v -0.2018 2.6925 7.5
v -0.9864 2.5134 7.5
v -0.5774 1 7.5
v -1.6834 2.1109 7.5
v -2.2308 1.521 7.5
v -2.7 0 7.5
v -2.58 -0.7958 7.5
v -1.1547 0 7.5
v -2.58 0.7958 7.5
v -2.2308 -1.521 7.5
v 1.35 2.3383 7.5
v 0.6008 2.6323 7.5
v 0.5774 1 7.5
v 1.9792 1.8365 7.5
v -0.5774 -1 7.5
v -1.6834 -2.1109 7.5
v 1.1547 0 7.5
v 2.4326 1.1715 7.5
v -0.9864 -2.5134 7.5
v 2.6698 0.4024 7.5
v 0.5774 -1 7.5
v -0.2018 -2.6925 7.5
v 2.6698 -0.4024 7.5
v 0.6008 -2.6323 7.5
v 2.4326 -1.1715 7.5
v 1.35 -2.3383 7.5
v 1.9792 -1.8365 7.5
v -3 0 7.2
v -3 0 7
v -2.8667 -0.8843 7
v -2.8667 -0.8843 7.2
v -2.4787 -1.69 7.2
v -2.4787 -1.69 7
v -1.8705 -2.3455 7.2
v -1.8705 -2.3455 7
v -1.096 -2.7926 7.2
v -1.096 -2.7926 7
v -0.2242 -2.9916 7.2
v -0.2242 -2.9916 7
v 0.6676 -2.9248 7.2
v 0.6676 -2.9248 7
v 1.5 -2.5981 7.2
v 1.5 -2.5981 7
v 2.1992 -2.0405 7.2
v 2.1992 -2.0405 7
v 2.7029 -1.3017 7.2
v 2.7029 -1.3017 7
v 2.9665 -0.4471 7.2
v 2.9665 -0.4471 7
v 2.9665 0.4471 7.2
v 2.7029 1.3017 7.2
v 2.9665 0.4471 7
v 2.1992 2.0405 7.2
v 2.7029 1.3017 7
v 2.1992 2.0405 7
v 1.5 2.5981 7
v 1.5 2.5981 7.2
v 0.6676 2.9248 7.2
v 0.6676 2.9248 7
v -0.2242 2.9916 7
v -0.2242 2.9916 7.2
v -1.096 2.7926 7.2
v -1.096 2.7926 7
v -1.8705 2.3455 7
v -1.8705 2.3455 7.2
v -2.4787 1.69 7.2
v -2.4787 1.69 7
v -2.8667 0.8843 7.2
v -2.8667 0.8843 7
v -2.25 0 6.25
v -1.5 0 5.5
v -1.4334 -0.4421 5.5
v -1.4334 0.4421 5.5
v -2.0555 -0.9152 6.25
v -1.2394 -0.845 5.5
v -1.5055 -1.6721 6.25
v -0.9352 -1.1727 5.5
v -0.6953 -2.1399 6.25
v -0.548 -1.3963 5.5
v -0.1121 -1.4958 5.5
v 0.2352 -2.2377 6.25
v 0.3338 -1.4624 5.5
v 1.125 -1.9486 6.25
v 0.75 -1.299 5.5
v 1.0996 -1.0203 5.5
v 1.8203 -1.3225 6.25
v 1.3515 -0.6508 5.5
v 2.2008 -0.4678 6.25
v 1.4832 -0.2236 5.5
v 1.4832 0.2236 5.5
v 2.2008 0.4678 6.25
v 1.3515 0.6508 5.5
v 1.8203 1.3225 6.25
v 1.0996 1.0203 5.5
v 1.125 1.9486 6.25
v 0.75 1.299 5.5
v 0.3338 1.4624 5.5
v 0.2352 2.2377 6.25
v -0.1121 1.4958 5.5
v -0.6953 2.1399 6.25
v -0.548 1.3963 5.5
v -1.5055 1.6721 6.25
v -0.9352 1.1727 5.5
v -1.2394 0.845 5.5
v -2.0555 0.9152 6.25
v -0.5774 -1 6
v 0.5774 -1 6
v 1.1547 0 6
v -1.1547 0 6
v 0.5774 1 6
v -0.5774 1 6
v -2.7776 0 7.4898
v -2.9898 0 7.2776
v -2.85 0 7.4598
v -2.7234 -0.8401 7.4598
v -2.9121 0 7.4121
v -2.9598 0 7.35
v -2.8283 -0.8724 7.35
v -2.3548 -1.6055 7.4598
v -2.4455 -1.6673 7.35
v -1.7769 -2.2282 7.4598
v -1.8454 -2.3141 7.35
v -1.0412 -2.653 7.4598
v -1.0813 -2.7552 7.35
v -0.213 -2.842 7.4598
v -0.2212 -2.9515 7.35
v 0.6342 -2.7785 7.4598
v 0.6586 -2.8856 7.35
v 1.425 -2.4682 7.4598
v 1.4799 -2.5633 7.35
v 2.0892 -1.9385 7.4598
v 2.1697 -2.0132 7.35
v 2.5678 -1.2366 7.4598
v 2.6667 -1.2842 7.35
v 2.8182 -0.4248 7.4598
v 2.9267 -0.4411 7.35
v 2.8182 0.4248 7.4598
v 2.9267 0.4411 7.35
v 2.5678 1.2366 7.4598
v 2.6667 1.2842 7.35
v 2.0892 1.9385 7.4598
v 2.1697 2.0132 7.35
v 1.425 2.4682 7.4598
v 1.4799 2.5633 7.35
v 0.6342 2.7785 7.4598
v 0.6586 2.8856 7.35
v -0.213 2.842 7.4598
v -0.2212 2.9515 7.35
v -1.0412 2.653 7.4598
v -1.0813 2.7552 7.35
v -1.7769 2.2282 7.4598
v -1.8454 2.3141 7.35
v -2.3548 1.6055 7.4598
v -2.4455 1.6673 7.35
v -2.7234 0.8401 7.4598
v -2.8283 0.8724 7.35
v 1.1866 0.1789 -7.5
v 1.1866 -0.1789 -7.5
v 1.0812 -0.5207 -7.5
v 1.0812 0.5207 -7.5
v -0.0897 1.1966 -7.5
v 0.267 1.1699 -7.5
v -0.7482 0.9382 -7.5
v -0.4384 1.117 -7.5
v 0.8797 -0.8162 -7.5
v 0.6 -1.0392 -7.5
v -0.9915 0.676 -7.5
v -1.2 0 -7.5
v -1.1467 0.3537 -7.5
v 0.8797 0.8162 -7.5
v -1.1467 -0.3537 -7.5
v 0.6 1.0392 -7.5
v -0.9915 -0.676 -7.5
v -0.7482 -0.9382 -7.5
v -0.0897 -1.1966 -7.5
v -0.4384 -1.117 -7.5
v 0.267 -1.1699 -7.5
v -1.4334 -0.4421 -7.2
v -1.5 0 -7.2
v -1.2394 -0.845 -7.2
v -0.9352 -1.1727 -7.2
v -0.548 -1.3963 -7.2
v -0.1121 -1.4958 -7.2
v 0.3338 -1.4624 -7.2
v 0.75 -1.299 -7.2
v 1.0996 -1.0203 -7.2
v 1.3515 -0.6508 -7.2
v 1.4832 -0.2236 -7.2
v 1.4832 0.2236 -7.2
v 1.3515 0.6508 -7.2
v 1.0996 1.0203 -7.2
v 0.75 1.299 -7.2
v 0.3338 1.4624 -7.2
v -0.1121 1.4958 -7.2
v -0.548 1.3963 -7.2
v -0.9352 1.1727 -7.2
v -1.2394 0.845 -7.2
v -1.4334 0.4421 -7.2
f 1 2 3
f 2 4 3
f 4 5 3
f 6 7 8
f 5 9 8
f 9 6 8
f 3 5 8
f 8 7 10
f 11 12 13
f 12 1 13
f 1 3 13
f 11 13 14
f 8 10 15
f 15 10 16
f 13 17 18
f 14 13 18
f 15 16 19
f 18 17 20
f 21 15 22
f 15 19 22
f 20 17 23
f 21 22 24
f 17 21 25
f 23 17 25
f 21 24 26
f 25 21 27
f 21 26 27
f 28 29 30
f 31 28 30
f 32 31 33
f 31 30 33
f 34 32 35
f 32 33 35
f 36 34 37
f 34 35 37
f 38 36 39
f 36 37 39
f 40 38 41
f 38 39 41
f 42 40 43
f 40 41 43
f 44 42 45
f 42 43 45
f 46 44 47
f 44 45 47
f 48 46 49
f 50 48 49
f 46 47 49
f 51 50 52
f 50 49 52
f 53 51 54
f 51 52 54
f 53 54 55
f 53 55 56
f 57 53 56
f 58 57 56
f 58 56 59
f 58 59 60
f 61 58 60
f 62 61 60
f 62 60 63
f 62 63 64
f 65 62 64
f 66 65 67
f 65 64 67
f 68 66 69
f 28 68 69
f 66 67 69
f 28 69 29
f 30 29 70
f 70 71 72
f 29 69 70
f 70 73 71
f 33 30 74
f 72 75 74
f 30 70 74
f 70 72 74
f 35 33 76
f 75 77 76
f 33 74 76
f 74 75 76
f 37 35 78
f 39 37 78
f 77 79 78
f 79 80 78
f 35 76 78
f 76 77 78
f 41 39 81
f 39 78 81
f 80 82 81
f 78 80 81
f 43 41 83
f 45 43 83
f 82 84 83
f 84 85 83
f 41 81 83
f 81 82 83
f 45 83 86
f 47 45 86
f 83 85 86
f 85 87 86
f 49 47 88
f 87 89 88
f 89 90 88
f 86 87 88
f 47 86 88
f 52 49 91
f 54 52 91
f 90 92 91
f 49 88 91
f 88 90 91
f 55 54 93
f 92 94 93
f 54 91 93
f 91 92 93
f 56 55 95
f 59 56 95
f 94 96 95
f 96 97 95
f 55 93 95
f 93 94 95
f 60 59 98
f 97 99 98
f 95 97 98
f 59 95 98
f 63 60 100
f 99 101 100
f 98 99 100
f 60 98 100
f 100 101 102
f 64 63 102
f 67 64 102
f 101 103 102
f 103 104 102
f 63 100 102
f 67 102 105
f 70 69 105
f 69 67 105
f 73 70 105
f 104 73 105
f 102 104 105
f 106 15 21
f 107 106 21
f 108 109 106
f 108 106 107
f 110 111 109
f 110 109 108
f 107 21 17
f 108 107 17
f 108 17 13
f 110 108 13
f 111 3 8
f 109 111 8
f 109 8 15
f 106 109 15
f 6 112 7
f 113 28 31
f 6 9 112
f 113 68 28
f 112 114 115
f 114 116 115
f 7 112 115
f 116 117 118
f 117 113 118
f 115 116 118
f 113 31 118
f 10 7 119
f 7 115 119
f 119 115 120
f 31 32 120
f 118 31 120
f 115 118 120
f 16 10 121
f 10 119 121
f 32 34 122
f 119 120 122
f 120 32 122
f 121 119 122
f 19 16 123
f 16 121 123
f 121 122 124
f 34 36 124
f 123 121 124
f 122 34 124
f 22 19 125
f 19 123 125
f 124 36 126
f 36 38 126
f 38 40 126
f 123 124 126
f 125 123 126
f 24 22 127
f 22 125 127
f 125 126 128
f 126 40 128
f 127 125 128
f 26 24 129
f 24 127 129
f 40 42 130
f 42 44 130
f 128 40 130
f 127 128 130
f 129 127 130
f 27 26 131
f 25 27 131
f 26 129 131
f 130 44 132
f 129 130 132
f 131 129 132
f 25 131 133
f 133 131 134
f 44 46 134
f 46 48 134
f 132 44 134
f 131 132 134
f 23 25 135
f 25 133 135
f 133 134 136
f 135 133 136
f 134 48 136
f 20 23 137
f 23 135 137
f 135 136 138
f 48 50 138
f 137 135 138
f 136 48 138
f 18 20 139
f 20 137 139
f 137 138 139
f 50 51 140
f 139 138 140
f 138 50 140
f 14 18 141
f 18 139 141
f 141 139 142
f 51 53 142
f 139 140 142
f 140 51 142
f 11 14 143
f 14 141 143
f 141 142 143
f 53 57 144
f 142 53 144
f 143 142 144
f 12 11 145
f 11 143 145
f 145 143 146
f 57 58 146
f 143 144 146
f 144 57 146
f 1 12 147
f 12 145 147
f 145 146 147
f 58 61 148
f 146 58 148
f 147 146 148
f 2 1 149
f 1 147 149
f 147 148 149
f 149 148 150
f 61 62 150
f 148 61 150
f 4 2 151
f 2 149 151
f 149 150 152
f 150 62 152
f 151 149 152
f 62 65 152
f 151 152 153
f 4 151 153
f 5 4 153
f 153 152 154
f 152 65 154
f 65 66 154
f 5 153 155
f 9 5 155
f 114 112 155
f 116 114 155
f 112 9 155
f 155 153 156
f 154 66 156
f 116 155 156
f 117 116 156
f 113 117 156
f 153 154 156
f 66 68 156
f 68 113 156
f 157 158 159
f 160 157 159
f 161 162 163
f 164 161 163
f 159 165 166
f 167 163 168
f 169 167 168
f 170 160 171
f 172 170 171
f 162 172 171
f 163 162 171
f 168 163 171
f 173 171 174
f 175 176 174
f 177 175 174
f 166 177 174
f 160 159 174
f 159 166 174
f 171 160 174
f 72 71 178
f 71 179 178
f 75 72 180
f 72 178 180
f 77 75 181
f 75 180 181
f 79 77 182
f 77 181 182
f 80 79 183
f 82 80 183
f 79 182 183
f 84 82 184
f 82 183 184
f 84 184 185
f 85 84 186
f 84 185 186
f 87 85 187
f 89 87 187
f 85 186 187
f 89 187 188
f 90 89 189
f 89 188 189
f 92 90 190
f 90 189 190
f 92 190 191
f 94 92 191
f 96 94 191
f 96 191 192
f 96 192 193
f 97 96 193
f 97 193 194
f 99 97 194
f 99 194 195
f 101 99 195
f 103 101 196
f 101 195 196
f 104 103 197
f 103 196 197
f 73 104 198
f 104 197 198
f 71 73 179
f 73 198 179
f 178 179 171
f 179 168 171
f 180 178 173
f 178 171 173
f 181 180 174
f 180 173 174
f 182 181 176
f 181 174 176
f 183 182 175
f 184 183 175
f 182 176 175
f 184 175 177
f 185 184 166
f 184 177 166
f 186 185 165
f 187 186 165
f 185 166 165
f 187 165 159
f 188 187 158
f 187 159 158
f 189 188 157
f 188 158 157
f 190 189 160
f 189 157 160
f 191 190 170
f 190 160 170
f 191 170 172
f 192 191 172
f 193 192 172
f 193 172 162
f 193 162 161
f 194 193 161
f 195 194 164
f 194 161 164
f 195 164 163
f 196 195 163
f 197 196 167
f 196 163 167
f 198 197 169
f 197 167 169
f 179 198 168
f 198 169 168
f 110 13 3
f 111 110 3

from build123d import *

# Parameters (mm, degrees)
CUT_EXTRUDE_1_DEPTH = 1.5
FILLET_1_R          = 0.3


with BuildPart() as part:
    # 草图1 → 旋转1 (revolve)
    with BuildSketch(Plane(origin=(0, 0, 0), x_dir=(0, 0, -1), z_dir=(1, 0, 0)), mode=Mode.PRIVATE) as revolve_1_sk:
        Polygon((-7.5, 0), (-7.5, 3), (-7, 3), (-5.5, 1.5), (7.2, 1.5), (7.5, 1.2), (7.5, 0), align=None)
    revolve(revolve_1_sk.sketch.rotate(Axis((0, 0, -7.5), (0, 0, 1)), 90), axis=Axis((0, 0, -7.5), (0, 0, 1)))

    # 草图2 → 切除-拉伸1 (cut)
    with BuildSketch(Plane.XY.offset(7.5)):
        Polygon((1.154700538, 0), (0.577350269, 1), (-0.577350269, 1), (-1.154700538, 0), (-0.577350269, -1), (0.577350269, -1), align=None)
    extrude(amount=-CUT_EXTRUDE_1_DEPTH, mode=Mode.SUBTRACT)

    # 圆角1
    fillet_1_edges = [part.edges().sort_by_distance(p)[0] for p in [
        (3, 0, 7.5),
    ]]
    fillet(fillet_1_edges, radius=FILLET_1_R)


solid = part.part
